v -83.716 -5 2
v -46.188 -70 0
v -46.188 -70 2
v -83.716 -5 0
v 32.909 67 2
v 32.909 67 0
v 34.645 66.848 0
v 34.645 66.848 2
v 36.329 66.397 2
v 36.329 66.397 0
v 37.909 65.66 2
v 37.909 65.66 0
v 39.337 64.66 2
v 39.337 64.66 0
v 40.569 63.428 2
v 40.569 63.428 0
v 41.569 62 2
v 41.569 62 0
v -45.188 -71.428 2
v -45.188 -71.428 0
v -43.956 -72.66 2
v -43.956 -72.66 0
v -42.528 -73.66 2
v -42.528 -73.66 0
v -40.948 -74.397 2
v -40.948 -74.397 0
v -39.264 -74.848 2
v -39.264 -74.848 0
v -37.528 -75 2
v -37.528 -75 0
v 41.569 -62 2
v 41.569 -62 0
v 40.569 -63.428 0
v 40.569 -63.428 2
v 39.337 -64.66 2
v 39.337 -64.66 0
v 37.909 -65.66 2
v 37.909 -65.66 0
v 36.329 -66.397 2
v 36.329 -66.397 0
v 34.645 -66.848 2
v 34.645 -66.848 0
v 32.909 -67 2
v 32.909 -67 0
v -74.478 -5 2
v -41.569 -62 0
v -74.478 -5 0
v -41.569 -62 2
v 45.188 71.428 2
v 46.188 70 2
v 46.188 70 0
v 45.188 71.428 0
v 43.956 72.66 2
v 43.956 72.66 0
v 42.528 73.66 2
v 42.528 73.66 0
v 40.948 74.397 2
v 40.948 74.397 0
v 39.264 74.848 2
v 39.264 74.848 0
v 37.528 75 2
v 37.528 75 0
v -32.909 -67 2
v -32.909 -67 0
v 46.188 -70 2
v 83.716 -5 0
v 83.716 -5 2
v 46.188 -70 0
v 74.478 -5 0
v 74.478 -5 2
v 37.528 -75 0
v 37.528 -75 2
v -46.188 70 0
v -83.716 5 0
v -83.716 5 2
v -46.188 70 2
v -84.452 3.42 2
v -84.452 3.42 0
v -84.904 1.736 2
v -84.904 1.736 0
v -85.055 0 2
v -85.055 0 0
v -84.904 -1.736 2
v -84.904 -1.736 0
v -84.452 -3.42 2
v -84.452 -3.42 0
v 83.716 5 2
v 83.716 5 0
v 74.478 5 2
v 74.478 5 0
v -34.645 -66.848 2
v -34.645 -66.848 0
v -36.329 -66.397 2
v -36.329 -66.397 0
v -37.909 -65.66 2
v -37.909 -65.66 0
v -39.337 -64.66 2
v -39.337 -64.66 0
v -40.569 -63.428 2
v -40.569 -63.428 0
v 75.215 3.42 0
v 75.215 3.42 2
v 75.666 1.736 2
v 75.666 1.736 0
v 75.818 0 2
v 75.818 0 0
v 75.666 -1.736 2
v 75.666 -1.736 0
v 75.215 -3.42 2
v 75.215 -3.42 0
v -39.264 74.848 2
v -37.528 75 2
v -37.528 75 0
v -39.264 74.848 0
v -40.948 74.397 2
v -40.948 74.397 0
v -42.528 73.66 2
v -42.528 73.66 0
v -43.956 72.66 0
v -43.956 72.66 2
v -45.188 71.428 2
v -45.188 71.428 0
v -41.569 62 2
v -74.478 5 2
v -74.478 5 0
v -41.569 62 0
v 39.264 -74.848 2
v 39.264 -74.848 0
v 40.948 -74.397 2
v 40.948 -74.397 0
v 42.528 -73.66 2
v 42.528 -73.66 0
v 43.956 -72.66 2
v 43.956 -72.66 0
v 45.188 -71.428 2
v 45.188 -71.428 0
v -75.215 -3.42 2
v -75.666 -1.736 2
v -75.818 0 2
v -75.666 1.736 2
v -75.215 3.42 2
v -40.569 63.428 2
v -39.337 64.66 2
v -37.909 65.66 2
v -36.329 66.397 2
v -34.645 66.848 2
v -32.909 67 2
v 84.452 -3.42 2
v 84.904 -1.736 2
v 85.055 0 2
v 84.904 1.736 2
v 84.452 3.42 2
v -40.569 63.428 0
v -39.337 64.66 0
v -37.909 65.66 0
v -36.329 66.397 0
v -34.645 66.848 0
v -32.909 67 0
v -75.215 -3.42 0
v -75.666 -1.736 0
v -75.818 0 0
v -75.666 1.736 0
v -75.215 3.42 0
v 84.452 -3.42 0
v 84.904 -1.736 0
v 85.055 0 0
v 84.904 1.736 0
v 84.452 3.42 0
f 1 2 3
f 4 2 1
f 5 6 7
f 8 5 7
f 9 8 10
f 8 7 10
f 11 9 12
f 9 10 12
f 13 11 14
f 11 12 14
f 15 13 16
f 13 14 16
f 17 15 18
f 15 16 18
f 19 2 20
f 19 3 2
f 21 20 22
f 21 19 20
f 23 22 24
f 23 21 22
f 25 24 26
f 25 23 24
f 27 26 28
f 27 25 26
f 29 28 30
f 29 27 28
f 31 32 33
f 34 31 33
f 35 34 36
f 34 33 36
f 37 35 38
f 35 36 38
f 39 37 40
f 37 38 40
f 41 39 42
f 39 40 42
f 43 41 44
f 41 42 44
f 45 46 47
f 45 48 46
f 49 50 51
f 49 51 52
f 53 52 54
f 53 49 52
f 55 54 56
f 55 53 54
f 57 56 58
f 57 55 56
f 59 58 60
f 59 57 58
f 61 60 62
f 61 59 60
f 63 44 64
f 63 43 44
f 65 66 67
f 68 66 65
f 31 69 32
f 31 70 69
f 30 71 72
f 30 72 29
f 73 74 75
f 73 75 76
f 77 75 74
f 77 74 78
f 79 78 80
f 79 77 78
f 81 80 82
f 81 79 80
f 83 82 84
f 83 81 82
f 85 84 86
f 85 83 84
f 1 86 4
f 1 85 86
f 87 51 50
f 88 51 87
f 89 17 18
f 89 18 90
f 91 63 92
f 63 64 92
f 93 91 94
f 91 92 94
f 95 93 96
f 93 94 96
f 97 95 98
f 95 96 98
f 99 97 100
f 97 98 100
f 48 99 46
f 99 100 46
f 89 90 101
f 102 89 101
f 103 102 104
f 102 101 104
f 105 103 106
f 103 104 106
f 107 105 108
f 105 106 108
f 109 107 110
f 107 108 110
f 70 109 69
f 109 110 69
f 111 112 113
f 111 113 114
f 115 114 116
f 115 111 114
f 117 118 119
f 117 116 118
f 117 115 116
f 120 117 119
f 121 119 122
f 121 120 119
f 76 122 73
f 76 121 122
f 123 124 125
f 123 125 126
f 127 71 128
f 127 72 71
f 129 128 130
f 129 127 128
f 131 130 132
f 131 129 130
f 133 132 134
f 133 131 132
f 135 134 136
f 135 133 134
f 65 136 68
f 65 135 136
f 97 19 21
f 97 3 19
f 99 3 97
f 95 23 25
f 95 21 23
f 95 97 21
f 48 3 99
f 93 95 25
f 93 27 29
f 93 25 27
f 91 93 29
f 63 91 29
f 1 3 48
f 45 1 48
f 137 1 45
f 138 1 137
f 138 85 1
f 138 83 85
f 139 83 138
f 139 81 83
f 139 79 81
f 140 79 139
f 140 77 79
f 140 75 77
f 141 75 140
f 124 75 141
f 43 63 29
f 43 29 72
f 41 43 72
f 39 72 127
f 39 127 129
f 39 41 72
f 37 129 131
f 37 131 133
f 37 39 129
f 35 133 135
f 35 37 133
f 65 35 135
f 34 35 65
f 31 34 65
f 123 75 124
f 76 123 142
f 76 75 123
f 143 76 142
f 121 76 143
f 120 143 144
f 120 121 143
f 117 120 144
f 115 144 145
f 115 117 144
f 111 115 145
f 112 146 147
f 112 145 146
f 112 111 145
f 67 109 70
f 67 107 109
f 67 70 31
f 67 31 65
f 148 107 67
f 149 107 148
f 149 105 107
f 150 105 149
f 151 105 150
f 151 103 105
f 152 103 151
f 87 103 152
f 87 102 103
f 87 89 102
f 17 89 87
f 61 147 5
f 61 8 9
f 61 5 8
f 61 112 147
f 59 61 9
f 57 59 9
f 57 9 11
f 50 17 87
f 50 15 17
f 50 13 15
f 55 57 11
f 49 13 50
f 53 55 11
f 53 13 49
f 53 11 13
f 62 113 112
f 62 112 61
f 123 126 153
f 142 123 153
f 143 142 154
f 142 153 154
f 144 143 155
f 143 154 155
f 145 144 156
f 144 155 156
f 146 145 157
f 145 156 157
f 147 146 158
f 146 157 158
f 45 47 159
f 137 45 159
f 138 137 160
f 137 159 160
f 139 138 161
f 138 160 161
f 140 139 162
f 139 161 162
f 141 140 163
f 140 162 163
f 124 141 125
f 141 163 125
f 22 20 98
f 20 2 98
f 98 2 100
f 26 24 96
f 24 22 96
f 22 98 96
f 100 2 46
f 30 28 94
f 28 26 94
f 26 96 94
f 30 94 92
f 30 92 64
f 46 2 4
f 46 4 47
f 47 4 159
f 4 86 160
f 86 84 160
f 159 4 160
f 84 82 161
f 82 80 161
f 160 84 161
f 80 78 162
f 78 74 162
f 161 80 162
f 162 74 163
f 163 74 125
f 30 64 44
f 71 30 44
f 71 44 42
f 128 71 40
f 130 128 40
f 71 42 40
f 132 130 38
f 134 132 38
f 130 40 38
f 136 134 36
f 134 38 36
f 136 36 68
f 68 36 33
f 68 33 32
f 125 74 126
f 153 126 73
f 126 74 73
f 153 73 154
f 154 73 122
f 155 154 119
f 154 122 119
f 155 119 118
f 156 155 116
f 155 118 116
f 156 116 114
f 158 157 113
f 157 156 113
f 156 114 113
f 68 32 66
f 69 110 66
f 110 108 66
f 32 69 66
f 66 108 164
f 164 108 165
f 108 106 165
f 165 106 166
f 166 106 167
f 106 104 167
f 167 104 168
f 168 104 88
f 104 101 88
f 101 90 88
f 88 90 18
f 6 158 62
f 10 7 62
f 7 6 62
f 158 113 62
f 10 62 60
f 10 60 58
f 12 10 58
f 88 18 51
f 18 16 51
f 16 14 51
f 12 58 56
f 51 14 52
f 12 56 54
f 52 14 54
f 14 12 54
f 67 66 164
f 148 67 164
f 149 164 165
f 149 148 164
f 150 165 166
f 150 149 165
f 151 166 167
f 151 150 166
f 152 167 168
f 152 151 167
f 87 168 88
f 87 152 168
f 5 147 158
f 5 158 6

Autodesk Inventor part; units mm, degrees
ref_plane "YZ Plane" through (0, 0, 0) normal (1, 0, 0) x (0, 1, 0)
ref_plane "XZ Plane" through (0, 0, 0) normal (0, 1, 0) x (-1, 0, 0)
ref_plane "XY Plane" through (0, 0, 0) normal (0, 0, 1) x (1, 0, 0)
sketch "Sketch1" plane through (0, 0, 0) normal (0, 0, 1) x (1, 0, 0)
  line L0 (43.3013, -75) -> (-43.3013, -75)
  line L1 (-43.3013, -75) -> (-86.6025, 0)
  line L2 (-86.6025, 0) -> (-43.3013, 75)
  line L3 (-43.3013, 75) -> (43.3013, 75)
  line L4 (43.3013, 75) -> (86.6025, 0)
  line L5 (86.6025, 0) -> (43.3013, -75)
  point P0 (0, 0)
  point P1 (0, 0)
  dimension "d0" = 150
extrude "Extrusion1" add sketch "Sketch1" along normal blind 2
sketch "Sketch7" plane through (0, 0, 2) normal (0, 0, 1) x (1, 0, 0)
  line L0 (40.9919, 71) -> (-40.9919, 71) projected
  line L1 (-40.9919, 71) -> (-81.9837, 0) projected
  line L2 (-81.9837, 0) -> (-40.9919, -71) projected
  line L3 (-40.9919, -71) -> (40.9919, -71) projected
  line L4 (40.9919, -71) -> (81.9837, 0) projected
  line L5 (81.9837, 0) -> (40.9919, 71) projected
  line L6 (-38.6825, -67) -> (-77.3649, 0)
  line L7 (-77.3649, 0) -> (-38.6825, 67)
  line L8 (-38.6825, 67) -> (38.6825, 67)
  line L9 (38.6825, 67) -> (77.3649, 0)
  line L10 (77.3649, 0) -> (38.6825, -67)
  line L11 (38.6825, -67) -> (-38.6825, -67)
  point P0 (0, 0)
  dimension "d19" = 4
extrude "Extrusion6" cut sketch "Sketch7" against normal blind 7 contours L6 L7 L8 L9 L10 L11
fillet "Fillet2" radius 10 6 edges at (38.6825, -67, 1) (77.3649, 0, 1) (38.6825, 67, 1) (-38.6825, 67, 1) (-77.3649, 0, 1) (-38.6825, -67, 1)
fillet "Fillet3" radius 10 6 edges at (-43.3013, 75, 1) (43.3013, 75, 1) (86.6025, 0, 1) (43.3013, -75, 1) (-43.3013, -75, 1) (-86.6025, 0, 1)
properties part number "Cover v1"
